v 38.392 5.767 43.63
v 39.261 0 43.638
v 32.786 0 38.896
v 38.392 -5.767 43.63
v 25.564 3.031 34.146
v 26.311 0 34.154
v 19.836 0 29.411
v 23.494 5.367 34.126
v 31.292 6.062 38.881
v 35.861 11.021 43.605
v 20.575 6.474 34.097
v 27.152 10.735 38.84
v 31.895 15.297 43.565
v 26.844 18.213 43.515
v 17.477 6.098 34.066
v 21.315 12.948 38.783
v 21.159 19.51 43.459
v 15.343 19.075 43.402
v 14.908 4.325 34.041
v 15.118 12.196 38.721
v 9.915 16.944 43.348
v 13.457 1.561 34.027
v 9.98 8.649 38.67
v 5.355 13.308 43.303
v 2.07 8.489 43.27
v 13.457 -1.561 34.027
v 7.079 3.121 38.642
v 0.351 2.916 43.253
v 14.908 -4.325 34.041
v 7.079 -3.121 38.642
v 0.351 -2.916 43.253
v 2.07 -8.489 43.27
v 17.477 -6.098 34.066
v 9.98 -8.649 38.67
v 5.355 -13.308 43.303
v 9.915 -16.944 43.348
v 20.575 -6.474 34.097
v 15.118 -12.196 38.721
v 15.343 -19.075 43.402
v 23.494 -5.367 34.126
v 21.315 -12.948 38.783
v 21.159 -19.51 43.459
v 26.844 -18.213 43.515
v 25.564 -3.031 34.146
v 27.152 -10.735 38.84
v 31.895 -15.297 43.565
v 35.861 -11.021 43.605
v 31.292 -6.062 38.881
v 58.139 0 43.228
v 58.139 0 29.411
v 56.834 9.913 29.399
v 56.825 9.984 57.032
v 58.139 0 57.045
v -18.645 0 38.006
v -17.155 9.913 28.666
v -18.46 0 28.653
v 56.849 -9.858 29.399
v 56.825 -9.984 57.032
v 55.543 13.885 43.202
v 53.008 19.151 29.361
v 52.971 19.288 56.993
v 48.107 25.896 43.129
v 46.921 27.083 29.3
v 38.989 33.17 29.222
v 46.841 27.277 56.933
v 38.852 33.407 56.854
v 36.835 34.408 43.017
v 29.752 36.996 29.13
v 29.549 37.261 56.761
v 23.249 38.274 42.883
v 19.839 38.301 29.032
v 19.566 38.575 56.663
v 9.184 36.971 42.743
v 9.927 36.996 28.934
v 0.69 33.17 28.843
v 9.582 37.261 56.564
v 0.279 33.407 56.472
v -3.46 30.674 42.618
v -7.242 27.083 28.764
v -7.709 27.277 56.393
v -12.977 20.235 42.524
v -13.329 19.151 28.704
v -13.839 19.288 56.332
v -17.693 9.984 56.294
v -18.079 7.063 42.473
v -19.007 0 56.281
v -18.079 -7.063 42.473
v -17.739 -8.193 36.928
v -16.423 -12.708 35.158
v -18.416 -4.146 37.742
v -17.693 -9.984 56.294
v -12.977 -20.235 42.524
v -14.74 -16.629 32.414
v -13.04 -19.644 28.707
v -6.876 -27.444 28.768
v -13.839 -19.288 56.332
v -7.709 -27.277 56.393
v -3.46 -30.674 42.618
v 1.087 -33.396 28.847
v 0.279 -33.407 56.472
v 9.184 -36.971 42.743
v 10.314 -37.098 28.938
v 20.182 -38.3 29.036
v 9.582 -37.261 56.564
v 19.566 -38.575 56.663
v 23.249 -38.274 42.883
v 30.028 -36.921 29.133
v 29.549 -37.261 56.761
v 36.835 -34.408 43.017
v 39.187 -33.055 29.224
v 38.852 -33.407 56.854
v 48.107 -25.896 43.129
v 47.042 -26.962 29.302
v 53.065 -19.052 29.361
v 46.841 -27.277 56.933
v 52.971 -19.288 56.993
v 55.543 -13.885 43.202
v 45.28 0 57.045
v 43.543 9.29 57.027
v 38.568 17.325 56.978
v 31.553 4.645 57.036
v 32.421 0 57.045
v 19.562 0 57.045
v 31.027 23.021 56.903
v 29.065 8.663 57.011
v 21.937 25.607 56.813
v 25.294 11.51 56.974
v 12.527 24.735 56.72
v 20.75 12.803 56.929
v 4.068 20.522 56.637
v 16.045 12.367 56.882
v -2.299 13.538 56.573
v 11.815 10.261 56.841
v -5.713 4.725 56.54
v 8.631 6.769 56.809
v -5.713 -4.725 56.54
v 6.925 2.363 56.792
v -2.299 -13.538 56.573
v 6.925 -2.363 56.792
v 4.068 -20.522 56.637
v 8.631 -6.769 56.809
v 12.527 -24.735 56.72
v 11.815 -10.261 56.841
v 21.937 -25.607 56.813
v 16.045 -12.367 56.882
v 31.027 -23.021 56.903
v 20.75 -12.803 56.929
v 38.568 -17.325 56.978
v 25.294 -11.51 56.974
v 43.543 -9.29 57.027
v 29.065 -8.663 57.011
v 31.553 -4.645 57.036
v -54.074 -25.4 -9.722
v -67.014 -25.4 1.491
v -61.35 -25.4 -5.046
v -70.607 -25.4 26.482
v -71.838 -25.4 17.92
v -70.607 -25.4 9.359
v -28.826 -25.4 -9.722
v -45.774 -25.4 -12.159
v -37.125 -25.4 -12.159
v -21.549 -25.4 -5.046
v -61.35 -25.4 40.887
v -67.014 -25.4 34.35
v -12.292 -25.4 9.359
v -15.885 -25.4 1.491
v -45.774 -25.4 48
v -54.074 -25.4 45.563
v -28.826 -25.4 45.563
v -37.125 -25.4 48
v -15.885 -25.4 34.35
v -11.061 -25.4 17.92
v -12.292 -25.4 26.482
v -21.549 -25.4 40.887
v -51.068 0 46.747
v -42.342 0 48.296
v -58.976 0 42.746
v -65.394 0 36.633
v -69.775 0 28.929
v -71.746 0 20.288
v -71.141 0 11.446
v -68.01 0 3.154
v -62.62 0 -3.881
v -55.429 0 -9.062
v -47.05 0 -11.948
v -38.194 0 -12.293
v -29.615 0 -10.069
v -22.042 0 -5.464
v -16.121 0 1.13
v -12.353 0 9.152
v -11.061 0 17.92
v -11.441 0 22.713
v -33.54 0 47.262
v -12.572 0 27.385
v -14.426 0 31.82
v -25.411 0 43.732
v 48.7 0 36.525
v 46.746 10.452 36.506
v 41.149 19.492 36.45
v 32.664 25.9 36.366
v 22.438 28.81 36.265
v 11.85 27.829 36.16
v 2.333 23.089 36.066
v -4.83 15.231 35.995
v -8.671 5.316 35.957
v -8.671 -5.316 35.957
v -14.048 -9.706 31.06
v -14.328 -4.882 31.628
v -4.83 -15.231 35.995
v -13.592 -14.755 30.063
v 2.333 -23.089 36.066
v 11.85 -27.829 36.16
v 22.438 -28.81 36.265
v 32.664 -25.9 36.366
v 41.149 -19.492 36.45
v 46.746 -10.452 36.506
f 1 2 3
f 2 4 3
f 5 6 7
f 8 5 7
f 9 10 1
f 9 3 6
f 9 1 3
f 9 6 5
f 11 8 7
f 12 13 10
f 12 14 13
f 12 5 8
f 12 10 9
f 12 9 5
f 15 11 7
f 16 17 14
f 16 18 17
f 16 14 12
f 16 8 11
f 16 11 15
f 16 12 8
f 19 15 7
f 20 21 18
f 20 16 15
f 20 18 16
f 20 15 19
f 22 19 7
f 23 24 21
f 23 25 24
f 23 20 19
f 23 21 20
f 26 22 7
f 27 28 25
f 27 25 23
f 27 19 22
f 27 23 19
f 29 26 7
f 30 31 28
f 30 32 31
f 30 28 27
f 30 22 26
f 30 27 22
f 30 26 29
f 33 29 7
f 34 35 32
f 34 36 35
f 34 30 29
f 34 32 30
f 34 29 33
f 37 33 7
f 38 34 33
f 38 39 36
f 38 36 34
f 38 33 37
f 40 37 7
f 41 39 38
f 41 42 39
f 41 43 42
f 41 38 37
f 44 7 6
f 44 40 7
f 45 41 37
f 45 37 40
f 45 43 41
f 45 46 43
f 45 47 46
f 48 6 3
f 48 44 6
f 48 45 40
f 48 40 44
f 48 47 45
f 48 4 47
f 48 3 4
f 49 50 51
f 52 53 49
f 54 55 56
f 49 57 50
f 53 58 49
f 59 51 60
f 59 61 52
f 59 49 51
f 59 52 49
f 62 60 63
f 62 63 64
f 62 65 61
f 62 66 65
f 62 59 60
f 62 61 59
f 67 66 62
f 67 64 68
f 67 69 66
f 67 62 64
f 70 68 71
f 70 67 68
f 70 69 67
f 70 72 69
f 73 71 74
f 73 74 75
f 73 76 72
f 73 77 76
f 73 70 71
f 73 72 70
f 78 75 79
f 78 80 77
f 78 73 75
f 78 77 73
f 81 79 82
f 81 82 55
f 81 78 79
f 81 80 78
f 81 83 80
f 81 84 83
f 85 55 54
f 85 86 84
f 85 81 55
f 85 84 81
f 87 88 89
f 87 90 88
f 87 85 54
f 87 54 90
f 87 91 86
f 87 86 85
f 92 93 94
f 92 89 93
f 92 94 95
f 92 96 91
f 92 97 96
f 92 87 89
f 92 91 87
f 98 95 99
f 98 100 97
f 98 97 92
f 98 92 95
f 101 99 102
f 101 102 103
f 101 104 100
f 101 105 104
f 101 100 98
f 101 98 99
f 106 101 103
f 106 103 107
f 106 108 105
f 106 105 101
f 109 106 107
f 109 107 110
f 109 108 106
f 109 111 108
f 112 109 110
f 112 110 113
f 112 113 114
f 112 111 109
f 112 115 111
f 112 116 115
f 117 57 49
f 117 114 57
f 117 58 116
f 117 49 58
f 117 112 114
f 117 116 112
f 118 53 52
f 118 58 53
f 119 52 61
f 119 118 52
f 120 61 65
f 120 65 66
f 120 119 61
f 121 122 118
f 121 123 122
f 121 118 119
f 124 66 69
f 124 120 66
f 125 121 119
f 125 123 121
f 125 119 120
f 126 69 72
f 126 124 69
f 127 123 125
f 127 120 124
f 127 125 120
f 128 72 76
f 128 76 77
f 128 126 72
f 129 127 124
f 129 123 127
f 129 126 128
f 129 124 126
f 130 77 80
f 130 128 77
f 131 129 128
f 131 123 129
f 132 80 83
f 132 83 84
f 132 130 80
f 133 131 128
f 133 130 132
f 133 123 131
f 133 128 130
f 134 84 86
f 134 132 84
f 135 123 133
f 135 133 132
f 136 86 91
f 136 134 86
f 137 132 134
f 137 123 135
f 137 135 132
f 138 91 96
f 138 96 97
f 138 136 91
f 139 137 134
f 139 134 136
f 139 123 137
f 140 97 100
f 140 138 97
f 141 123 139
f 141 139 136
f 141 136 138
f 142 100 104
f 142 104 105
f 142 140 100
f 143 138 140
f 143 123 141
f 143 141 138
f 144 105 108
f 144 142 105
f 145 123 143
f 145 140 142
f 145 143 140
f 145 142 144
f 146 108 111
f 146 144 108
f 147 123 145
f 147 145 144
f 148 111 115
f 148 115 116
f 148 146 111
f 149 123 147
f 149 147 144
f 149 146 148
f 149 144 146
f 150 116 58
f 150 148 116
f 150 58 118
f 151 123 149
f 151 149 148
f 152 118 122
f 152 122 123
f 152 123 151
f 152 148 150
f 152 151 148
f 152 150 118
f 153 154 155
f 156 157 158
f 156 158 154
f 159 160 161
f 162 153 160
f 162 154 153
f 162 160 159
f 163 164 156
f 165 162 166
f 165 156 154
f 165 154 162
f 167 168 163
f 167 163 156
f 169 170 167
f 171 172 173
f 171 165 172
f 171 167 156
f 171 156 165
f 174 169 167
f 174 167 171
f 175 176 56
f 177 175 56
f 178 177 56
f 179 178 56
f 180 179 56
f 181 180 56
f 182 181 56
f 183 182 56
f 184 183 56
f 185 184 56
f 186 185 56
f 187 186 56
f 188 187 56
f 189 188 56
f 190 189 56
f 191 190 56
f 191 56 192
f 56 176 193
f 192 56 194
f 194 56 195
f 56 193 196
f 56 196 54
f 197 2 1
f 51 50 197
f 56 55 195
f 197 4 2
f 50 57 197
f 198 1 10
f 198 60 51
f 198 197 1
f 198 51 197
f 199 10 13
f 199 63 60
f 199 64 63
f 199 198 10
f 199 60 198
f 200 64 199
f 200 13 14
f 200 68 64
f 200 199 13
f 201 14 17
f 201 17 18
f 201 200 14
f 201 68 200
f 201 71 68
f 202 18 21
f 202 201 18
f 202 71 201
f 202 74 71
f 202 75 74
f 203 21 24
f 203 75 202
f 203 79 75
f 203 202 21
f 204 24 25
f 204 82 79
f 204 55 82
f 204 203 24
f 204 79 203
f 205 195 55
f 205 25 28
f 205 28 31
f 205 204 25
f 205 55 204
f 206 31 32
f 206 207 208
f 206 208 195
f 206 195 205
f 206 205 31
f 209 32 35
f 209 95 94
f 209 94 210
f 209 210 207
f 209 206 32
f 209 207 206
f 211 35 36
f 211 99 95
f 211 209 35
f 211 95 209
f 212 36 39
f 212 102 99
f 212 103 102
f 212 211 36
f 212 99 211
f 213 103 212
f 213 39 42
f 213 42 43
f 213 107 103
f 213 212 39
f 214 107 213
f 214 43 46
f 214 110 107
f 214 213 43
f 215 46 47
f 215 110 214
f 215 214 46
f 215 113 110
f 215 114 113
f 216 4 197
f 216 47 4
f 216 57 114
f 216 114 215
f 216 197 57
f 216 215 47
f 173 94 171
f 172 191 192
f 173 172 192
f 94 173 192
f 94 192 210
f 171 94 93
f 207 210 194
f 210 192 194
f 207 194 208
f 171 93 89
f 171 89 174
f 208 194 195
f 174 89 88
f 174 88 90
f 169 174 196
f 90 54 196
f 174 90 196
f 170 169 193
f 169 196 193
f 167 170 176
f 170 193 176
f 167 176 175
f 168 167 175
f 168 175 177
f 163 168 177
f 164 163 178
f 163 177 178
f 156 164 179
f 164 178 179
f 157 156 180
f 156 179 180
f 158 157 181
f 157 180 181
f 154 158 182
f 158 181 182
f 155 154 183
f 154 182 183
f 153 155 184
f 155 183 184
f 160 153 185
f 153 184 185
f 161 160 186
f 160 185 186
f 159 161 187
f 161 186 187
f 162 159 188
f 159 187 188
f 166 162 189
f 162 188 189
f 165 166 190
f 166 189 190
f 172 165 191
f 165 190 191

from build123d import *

# Parameters (mm, degrees)
F0_R     = 30.3887590566
F1_DEPTH = 25.4


with BuildPart() as f1:
    # F0 (on Front) → F1 (new body)
    with BuildSketch(Plane.XZ):
        with Locations((-41.4496473968, 17.9204754531)):
            Circle(F0_R)
    extrude(amount=F1_DEPTH)

    # F2 (on Front) → F3 (revolve)
    with BuildSketch(Plane.XZ):
        Polygon((58.1389442086, 57.0445582271), (19.5620451123, 57.0445582271), (19.835639745, 29.4114630669), (39.2608866096, 43.6384007335), (58.1389442086, 29.4114630669), align=None)
    revolve(axis=Axis((19.6988424286, 0, 43.228010647), (-0.0099004915, 0, 0.9999509889)))


solid = f1.part
